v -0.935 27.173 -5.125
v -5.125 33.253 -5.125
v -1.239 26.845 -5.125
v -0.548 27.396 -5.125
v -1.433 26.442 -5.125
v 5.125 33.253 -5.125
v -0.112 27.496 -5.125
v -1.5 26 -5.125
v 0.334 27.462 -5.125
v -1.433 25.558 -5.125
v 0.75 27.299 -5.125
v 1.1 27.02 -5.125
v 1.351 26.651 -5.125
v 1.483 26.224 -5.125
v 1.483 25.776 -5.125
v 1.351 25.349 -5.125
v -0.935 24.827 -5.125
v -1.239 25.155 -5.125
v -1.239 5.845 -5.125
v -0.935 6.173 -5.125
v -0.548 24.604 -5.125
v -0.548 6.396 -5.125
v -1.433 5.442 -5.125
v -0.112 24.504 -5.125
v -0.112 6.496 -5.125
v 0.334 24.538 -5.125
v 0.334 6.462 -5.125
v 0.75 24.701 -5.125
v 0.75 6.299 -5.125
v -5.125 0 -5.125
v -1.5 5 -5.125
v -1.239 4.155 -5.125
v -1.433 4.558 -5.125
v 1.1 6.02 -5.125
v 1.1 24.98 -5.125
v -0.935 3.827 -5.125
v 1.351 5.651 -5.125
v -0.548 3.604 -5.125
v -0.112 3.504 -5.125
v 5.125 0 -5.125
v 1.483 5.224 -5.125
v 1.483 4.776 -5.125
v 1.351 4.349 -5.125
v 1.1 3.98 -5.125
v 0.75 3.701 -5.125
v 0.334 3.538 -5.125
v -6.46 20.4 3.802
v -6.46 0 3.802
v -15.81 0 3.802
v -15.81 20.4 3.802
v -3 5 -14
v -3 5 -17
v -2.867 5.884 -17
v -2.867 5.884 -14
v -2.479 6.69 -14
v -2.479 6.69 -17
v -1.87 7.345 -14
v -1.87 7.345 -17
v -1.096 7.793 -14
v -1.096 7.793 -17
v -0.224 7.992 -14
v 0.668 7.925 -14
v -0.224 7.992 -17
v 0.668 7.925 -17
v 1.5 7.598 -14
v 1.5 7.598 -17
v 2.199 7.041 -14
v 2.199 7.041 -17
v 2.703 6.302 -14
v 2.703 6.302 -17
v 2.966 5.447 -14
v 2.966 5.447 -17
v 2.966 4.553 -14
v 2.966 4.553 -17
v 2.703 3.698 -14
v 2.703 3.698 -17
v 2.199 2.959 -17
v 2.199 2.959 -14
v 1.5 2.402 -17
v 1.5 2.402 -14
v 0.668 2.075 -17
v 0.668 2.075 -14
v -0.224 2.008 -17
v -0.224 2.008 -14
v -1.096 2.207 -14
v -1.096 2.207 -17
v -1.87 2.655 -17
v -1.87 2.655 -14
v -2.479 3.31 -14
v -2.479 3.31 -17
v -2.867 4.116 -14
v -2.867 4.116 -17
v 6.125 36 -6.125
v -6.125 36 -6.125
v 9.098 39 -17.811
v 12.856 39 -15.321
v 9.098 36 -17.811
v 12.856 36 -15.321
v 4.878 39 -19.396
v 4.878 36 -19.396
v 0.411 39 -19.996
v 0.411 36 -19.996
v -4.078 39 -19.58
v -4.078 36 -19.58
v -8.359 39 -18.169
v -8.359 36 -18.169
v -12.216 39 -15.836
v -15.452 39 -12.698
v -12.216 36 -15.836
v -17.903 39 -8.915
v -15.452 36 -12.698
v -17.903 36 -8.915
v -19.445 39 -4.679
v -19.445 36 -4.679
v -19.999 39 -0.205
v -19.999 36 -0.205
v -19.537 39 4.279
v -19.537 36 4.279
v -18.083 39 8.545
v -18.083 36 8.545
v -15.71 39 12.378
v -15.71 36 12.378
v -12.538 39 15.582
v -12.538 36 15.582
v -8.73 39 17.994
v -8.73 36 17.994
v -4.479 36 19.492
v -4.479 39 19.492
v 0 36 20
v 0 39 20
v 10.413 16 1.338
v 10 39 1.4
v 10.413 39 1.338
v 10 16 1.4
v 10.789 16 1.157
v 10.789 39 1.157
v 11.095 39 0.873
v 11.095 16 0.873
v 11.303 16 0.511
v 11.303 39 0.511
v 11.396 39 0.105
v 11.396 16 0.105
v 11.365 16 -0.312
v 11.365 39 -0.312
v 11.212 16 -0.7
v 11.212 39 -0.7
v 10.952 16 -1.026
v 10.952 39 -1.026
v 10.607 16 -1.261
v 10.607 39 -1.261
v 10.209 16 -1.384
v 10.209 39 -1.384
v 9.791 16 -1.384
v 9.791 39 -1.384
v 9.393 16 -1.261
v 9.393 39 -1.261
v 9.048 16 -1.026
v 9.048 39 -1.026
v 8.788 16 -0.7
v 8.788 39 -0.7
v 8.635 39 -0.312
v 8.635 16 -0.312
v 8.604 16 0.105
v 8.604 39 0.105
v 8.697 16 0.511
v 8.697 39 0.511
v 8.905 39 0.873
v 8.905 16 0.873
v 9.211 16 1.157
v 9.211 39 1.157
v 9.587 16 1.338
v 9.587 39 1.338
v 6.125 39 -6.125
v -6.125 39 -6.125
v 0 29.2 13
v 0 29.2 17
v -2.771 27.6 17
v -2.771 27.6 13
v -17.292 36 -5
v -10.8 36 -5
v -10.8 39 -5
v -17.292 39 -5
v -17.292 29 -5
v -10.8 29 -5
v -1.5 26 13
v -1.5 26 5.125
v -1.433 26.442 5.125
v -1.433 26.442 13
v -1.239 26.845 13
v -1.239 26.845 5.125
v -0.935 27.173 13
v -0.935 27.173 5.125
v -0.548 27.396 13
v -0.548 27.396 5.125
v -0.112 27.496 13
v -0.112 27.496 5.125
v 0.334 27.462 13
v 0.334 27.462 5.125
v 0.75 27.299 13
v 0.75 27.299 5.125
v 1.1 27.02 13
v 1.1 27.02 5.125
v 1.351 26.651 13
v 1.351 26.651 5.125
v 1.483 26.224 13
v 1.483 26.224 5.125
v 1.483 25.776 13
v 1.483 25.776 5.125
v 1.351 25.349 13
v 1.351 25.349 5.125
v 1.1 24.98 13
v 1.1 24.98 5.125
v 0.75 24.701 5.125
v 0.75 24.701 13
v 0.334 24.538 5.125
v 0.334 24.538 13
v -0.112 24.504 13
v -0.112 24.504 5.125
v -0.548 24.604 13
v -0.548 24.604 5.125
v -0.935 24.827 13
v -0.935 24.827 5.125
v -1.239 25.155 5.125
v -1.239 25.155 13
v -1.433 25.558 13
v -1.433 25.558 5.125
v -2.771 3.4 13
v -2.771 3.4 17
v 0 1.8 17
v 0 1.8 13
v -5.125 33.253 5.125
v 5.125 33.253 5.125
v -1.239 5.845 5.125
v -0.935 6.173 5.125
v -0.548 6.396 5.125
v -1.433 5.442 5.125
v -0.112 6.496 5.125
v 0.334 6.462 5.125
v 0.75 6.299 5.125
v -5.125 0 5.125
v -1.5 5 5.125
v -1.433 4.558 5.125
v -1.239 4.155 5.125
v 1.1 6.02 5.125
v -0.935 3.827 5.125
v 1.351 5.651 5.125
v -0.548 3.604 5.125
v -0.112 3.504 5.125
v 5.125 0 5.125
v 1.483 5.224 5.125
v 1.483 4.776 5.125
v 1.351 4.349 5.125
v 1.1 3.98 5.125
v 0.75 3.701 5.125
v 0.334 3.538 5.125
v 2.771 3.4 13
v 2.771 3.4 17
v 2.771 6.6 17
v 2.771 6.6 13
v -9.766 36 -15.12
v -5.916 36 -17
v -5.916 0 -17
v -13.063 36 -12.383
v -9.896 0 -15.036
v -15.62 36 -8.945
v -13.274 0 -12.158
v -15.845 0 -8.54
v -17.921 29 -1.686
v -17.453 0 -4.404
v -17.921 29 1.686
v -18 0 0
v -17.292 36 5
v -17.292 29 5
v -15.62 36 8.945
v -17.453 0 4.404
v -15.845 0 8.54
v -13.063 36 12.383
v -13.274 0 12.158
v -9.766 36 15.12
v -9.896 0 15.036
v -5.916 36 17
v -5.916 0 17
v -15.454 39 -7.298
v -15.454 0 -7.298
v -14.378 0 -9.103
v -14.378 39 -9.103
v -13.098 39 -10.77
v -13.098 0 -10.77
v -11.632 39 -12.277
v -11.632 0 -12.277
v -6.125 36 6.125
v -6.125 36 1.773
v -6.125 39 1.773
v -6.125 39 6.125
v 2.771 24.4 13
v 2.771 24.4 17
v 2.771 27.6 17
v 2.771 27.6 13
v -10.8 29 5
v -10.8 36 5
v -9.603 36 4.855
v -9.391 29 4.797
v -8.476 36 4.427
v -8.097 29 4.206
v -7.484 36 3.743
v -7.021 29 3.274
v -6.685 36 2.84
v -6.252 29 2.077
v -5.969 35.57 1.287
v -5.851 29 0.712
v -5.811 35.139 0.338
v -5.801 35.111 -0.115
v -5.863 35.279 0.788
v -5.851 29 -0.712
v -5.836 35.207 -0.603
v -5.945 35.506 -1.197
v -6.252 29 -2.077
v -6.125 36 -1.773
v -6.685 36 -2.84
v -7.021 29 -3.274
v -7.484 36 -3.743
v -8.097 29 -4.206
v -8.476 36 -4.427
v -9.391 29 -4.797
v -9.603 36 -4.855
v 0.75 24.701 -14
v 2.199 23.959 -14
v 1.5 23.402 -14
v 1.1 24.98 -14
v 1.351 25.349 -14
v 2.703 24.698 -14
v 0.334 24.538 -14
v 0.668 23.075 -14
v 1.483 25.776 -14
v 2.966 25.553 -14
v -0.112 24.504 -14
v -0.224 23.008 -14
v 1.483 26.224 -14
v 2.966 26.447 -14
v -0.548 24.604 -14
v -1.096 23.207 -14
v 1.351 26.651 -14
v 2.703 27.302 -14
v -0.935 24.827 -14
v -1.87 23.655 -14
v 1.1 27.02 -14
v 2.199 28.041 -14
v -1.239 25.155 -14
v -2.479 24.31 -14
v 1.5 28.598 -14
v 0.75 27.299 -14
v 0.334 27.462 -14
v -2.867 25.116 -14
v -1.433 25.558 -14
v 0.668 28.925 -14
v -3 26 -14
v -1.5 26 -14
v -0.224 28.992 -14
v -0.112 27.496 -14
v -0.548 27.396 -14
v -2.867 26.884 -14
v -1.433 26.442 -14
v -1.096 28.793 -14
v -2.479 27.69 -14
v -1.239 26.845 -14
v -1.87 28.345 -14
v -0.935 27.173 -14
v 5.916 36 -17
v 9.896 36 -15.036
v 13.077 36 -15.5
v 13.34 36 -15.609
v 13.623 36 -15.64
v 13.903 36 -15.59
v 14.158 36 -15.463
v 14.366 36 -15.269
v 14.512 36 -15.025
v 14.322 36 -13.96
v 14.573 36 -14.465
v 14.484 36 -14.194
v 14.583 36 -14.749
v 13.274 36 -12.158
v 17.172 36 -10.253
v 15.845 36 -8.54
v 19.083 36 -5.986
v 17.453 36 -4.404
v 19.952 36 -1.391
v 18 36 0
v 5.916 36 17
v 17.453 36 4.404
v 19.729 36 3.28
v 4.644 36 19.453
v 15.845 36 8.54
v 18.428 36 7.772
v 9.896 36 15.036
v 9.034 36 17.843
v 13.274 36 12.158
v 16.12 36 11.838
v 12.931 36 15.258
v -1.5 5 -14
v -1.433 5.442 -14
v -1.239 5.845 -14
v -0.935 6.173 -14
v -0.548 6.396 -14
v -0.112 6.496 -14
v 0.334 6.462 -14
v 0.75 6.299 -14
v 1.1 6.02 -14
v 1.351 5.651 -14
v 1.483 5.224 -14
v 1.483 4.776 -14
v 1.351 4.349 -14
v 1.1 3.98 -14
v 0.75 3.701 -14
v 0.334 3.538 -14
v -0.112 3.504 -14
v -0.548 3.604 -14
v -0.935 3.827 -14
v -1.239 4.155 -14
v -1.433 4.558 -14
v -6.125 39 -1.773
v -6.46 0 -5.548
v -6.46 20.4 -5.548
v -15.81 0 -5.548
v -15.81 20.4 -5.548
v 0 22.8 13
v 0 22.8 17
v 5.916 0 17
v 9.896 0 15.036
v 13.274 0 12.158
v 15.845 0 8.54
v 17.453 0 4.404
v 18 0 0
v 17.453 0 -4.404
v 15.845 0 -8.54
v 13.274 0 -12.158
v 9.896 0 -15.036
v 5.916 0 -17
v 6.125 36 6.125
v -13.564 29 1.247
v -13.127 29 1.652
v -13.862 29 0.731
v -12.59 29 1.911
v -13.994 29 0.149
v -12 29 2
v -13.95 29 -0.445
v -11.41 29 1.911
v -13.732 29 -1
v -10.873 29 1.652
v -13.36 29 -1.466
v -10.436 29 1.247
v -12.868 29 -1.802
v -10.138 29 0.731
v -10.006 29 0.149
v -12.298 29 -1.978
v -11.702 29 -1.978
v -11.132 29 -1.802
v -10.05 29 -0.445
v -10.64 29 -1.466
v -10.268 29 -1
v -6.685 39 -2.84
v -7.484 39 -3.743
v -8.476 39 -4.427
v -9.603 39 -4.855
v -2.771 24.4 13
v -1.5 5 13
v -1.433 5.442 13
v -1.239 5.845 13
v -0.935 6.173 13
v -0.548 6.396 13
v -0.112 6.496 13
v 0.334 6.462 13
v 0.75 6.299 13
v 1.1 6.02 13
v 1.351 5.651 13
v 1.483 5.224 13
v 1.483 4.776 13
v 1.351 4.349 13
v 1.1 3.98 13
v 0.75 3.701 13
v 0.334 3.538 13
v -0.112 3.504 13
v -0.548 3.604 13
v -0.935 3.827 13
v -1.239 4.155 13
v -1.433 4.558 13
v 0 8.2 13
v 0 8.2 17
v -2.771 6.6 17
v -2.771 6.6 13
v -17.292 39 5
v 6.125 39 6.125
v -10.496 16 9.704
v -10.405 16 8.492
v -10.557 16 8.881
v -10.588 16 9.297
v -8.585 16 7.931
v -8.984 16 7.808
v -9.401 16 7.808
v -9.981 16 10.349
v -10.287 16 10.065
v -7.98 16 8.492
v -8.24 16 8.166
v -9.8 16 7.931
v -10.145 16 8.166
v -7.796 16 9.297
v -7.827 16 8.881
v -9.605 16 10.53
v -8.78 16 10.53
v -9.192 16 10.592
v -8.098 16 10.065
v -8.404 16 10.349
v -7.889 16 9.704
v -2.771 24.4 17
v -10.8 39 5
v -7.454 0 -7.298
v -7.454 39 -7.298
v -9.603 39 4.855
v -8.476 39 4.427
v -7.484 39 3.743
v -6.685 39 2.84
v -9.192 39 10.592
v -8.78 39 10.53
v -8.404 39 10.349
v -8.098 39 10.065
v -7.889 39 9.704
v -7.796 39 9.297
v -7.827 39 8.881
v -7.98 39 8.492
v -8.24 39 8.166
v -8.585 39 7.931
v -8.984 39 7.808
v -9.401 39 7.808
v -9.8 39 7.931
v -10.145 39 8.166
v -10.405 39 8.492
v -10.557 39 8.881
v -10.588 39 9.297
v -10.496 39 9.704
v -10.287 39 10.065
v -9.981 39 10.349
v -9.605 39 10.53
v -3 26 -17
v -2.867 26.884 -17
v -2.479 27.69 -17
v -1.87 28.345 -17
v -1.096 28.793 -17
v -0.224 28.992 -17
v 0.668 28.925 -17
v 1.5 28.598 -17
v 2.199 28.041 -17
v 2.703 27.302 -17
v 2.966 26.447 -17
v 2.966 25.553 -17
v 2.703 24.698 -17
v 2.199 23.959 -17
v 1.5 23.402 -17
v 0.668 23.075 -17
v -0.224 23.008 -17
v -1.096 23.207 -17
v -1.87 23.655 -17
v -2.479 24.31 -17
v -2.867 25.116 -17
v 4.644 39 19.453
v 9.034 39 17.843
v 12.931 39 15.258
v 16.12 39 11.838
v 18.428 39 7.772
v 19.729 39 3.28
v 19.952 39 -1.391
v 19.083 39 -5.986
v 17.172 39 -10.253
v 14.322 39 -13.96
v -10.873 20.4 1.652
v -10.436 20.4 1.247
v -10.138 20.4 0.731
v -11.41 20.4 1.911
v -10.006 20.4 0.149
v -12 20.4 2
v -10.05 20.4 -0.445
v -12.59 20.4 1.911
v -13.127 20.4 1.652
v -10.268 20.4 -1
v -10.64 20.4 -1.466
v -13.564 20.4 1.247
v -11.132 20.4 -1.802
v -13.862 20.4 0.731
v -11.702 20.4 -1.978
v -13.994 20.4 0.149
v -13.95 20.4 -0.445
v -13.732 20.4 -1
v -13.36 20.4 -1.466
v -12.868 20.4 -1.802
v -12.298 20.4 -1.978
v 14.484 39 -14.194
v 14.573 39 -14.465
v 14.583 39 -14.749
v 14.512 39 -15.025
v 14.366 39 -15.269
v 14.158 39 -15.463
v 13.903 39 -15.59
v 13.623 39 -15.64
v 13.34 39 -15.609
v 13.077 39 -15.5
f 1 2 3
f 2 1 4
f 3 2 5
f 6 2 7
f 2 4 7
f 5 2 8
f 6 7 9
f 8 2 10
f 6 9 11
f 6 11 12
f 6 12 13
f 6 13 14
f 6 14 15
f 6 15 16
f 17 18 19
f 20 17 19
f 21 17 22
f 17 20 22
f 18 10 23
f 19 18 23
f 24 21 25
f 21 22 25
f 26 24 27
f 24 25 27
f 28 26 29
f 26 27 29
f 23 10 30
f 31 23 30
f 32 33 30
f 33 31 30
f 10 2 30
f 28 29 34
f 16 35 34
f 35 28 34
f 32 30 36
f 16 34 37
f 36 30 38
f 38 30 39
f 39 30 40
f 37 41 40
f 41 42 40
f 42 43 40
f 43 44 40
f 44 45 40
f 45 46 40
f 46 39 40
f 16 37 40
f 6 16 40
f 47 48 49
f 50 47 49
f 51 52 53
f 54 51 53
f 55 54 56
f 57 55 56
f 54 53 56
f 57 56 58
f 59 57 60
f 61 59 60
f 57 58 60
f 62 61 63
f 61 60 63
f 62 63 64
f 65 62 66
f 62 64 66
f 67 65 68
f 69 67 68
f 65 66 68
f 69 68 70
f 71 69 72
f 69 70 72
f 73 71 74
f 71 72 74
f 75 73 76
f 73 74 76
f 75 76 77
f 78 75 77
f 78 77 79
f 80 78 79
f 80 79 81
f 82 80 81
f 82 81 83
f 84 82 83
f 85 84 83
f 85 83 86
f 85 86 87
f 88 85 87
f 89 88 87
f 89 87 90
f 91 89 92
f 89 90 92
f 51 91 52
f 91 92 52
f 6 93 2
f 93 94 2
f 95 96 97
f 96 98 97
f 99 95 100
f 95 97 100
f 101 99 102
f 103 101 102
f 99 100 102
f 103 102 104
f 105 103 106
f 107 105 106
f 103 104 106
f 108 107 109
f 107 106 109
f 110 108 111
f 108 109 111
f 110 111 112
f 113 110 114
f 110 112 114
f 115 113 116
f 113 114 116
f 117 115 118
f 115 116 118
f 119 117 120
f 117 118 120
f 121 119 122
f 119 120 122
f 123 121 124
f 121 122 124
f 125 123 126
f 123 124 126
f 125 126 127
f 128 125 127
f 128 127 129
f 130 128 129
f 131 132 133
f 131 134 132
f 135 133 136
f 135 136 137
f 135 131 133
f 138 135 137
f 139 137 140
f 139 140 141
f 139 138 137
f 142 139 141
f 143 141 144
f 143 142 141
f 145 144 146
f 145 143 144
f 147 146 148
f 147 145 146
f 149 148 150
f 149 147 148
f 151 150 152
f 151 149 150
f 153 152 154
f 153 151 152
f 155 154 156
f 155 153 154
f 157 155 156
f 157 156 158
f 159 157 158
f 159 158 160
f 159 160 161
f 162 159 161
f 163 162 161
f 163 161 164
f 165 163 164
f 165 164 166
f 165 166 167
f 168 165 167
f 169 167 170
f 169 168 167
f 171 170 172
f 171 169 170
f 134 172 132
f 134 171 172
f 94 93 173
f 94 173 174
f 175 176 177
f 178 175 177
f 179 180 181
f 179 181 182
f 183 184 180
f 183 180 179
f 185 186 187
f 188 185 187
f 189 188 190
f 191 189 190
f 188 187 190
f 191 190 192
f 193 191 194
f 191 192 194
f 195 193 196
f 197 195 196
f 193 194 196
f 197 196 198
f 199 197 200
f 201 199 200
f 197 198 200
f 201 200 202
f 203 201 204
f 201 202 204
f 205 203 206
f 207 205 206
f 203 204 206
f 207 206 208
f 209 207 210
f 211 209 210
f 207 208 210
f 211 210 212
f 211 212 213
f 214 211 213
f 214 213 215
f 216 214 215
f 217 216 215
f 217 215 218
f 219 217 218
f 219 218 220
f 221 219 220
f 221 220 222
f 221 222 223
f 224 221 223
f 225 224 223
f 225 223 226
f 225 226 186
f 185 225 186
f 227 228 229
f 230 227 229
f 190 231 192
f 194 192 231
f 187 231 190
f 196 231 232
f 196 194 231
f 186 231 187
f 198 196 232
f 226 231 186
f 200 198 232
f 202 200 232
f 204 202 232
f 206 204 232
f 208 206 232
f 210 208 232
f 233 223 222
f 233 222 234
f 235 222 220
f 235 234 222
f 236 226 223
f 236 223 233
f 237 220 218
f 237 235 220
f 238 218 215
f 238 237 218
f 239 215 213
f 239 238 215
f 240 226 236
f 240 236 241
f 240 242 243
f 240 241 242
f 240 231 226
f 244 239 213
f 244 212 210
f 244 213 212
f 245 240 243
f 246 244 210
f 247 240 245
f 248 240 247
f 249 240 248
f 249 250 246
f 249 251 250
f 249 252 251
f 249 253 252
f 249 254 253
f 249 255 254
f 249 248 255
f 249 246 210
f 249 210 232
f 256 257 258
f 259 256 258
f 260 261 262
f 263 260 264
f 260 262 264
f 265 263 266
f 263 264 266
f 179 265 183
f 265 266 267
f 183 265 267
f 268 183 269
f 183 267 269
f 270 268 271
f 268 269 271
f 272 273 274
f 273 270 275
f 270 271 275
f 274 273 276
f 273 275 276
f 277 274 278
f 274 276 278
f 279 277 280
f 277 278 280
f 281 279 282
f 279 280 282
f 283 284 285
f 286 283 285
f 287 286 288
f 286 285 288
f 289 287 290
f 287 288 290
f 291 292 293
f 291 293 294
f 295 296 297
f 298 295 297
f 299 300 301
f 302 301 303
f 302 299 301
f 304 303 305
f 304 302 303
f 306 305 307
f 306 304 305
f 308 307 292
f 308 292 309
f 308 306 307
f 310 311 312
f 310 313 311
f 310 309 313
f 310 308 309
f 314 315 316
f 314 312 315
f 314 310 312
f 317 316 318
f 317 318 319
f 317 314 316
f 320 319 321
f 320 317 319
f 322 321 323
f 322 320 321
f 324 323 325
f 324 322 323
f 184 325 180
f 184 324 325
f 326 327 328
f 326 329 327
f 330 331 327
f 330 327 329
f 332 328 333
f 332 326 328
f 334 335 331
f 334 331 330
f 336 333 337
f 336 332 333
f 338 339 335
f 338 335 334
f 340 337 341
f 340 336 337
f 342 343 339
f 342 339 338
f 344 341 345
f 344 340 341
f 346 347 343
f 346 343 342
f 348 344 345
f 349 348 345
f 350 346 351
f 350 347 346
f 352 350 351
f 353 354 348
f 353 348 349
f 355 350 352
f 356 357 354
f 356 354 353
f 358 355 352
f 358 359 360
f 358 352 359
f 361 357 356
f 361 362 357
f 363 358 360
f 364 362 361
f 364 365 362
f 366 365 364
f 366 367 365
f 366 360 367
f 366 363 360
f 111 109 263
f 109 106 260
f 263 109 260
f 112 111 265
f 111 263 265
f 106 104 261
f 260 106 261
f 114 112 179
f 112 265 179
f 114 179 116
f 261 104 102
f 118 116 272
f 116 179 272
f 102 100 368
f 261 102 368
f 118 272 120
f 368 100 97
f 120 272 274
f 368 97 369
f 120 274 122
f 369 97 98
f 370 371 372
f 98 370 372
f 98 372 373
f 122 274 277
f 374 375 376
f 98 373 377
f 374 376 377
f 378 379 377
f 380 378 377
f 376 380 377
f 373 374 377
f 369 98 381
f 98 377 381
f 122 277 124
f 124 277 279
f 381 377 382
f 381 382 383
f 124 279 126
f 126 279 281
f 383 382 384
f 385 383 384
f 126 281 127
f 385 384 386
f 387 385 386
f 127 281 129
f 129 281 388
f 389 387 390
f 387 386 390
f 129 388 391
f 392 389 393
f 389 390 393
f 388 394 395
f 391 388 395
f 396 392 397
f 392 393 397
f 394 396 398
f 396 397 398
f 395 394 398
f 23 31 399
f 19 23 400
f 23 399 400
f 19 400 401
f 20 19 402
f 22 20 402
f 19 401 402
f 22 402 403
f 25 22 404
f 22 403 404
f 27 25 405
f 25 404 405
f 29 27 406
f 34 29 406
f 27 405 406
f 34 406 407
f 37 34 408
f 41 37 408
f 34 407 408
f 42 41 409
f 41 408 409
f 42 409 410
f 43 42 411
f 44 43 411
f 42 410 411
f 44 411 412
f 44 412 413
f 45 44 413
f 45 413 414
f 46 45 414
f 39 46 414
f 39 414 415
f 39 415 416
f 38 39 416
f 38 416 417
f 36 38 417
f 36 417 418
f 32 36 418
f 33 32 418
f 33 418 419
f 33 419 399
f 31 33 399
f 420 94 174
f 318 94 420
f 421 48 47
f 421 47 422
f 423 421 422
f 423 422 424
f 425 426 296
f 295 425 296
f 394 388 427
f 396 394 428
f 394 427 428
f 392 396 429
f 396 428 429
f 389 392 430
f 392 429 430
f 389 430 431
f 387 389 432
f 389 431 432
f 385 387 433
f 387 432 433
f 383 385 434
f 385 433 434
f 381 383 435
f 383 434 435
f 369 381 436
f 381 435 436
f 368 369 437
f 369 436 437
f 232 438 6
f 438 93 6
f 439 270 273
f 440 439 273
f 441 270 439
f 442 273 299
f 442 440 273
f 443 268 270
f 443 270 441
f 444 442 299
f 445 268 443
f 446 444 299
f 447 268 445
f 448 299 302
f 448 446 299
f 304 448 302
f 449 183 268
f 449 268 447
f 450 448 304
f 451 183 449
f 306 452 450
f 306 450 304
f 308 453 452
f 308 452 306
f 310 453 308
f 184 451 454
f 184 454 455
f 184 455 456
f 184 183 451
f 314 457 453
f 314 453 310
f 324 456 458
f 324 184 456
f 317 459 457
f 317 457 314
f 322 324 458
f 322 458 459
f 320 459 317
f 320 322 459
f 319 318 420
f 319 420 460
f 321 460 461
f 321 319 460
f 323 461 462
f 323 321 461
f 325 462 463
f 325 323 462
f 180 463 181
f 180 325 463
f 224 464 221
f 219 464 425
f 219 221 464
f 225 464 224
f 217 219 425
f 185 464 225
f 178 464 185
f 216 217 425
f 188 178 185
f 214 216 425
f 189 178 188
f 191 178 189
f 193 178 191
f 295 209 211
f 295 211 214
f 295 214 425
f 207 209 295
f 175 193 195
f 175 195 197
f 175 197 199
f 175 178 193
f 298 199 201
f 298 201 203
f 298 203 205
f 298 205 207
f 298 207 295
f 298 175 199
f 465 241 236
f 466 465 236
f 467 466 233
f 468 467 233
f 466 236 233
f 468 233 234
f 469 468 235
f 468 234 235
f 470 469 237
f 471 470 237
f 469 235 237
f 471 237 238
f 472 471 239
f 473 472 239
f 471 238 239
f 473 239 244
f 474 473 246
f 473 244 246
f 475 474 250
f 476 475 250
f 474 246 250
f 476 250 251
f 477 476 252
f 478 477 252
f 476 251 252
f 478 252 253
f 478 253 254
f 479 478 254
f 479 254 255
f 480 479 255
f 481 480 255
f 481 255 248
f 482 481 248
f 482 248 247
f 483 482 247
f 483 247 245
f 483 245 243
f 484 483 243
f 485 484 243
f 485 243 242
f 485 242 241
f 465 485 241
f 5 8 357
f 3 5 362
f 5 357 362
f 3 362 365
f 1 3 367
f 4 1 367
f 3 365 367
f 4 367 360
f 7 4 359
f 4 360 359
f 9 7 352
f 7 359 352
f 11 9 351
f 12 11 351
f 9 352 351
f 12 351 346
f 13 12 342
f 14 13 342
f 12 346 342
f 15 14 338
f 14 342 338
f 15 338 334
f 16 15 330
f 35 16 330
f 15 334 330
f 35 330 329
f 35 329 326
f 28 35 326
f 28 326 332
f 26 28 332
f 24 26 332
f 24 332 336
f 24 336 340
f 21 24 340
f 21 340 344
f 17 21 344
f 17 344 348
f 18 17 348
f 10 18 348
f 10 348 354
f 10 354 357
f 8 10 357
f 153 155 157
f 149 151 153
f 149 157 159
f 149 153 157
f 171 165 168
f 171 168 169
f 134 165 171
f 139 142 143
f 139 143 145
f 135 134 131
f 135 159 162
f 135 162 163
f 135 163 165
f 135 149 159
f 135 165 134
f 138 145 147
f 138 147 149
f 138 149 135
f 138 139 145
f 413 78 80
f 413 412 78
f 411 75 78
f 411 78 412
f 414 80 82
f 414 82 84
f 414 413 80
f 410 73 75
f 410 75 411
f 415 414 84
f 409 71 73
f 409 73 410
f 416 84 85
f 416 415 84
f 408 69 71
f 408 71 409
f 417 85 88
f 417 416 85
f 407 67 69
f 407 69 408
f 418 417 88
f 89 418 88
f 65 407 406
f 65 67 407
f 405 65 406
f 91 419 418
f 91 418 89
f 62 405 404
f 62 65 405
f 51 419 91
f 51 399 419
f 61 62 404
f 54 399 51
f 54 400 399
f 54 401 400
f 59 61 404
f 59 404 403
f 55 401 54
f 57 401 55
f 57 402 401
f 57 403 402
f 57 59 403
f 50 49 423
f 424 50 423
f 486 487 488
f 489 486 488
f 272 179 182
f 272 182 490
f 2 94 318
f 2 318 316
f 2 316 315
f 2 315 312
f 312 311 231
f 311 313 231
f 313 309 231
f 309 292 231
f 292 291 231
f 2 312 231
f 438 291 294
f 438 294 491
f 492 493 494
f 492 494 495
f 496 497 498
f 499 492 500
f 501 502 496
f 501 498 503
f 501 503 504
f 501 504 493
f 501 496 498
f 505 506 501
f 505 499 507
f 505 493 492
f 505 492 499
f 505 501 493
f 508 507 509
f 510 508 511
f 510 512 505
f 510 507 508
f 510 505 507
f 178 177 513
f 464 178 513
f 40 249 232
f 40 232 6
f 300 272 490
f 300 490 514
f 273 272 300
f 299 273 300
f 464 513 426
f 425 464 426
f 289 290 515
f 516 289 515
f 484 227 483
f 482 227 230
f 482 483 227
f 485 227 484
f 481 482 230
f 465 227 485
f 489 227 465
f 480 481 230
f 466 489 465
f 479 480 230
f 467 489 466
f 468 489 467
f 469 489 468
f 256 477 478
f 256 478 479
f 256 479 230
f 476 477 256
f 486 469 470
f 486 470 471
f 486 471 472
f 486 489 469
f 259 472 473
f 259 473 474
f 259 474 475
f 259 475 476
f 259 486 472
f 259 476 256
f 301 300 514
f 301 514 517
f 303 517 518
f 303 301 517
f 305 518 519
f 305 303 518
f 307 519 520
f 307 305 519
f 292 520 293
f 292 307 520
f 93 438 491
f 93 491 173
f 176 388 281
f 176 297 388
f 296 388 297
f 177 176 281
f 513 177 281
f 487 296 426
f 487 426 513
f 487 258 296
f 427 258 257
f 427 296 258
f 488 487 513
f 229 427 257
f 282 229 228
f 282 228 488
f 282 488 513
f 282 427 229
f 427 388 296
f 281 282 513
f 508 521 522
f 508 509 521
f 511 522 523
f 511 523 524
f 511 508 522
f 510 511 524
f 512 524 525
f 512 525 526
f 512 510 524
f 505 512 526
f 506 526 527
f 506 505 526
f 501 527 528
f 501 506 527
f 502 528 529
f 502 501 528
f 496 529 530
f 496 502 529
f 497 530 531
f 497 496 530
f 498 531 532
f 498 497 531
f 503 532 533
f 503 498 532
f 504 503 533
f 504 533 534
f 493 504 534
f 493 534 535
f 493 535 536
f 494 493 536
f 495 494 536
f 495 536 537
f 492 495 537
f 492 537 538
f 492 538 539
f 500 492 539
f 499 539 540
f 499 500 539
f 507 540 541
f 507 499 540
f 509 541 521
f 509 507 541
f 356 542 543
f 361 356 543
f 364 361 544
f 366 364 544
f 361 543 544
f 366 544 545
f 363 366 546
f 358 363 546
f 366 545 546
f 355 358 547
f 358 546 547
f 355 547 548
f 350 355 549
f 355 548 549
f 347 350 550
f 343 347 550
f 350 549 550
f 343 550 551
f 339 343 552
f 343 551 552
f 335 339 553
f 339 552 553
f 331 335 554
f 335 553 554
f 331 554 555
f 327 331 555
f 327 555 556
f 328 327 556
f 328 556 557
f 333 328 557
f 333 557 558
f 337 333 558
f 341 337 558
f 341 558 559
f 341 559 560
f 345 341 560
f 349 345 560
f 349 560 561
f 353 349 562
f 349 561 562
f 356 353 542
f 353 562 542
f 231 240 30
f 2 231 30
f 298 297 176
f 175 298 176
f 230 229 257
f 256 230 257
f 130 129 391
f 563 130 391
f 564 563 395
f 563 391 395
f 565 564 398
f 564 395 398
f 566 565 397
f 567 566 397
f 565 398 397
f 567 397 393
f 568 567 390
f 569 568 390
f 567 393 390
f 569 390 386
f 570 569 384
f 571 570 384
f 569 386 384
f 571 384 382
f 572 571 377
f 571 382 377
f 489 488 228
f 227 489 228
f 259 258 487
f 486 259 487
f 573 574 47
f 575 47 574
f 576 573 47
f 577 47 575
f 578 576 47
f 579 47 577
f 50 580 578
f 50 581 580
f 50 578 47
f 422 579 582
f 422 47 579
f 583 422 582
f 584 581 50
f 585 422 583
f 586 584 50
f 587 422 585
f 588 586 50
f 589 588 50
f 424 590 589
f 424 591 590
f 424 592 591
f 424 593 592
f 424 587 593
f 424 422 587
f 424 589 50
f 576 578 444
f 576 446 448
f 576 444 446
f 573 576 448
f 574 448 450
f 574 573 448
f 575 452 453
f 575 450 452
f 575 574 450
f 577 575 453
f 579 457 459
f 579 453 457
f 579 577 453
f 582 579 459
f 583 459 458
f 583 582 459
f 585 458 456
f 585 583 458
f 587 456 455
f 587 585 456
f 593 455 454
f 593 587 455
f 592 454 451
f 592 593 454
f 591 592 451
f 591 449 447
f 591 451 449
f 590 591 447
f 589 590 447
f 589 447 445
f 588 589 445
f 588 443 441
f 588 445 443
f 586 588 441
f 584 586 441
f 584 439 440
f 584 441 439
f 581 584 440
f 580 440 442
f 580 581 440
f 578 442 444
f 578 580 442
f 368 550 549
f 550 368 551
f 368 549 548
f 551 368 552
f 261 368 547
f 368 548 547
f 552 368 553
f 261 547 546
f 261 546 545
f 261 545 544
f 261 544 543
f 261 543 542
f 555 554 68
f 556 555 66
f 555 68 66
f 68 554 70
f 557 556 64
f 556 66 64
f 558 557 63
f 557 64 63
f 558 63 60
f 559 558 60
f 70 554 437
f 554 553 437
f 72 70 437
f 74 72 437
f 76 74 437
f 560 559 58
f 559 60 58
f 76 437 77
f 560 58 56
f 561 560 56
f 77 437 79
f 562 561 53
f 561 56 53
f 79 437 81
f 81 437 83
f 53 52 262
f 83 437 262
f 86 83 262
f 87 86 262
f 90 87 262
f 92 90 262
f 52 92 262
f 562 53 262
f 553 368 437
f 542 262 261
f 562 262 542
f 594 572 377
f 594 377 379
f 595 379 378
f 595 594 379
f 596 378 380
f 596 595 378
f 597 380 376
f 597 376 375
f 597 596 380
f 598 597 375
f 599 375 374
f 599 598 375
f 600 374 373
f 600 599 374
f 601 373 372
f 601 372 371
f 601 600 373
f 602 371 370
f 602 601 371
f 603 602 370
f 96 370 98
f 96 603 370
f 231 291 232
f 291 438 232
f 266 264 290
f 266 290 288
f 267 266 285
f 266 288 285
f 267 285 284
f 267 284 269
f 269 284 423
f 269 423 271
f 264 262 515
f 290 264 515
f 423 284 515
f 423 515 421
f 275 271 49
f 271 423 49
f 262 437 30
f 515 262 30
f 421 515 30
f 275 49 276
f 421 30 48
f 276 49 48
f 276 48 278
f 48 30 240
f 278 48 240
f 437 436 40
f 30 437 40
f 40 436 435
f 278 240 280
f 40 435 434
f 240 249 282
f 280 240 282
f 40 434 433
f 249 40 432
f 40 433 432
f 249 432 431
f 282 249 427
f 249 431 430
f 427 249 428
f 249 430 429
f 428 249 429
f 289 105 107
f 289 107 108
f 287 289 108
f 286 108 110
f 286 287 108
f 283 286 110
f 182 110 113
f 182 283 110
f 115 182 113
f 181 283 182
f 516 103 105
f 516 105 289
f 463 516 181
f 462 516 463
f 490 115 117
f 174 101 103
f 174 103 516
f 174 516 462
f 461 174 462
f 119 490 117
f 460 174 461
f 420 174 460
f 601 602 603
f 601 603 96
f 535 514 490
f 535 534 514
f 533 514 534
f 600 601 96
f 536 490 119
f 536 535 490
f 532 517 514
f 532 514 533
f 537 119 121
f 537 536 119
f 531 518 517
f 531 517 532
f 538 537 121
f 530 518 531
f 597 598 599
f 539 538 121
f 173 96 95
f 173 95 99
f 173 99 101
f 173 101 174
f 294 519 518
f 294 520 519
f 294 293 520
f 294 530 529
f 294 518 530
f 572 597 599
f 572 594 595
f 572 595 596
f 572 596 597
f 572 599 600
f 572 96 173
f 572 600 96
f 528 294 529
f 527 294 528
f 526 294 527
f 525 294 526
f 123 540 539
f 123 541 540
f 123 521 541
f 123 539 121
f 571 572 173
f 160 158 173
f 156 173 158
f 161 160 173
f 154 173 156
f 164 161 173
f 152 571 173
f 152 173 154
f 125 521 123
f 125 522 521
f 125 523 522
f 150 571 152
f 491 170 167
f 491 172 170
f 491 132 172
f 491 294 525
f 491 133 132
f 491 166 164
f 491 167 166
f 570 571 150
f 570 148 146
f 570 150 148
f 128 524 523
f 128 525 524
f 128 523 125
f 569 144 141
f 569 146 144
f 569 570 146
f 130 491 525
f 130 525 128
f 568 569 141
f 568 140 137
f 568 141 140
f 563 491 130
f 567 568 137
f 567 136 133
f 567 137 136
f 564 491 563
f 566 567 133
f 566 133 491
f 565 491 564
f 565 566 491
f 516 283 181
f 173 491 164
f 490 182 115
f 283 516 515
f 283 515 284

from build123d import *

# Parameters (mm, degrees)
SKETCH1_R           = 18
SKETCH1_R_2         = 2
SKETCH1_W           = 10.25
SKETCH1_H           = 10.25
BOSS_EXTRUDE1_DEPTH = 36
CUT_EXTRUDE1_START  = -7
CUT_EXTRUDE1_DEPTH  = 7
SKETCH4_W           = 9.35
SKETCH4_H           = 9.35
CUT_EXTRUDE3_DEPTH  = 20.4
CUT_EXTRUDE4_START  = -40
CUT_EXTRUDE4_DEPTH  = 40
SKETCH6_R           = 1.5
CUT_EXTRUDE5_DEPTH  = 53.687759489
SKETCH7_R           = 3
CUT_EXTRUDE6_DEPTH  = 3
CUT_EXTRUDE7_DEPTH  = 4
CHAMFER1_SIZE       = 1
CHAMFER1_SIZE_2     = 2.747477419
CUT_EXTRUDE8_DEPTH  = 44.69210455
SKETCH12_R          = 1.4
CUT_EXTRUDE10_DEPTH = 20
SKETCH13_R          = 20
SKETCH13_R_2        = 1.4
BOSS_EXTRUDE2_DEPTH = 3
BOSS_EXTRUDE3_DEPTH = 3


with BuildPart() as part:
    # Sketch1 → Boss-Extrude1 (new body)
    with BuildSketch(Plane(origin=(0, 0, 0), x_dir=(1, 0, 0), z_dir=(0, 1, 0))):
        with Locations(Location((0, 0, 0), (0, 0, 270))):
            Circle(SKETCH1_R)
        with Locations(Location((-12, 0, 0), (0, 0, 270))):
            Circle(SKETCH1_R_2, mode=Mode.SUBTRACT)
        Rectangle(SKETCH1_W, SKETCH1_H, mode=Mode.SUBTRACT)
    extrude(amount=BOSS_EXTRUDE1_DEPTH)

    # Sketch2 → Cut-Extrude1 (cut)
    with BuildSketch(Plane(origin=(0, 36, 0), x_dir=(1, 0, 0), z_dir=(0, 1, 0)).offset(CUT_EXTRUDE1_START)):
        with BuildLine():
            Line((-10.8, 5), (-17.291616466, 5))
            ThreePointArc((-17.291616466, 5), (-18, 0), (-17.291616466, -5))
            Line((-17.291616466, -5), (-10.8, -5))
            ThreePointArc((-10.8, -5), (-5.8, 0), (-10.8, 5))
        make_face()
    extrude(amount=CUT_EXTRUDE1_DEPTH, mode=Mode.SUBTRACT)

    # Sketch4 → Cut-Extrude3 (cut)
    with BuildSketch(Plane(origin=(0, 0, 0), x_dir=(-1, 0, 0), z_dir=(0, -1, 0))):
        with Locations((11.135393506, 0.872889968)):
            Rectangle(SKETCH4_W, SKETCH4_H)
    extrude(amount=-CUT_EXTRUDE3_DEPTH, mode=Mode.SUBTRACT)

    # Sketch5 → Cut-Extrude4 (cut)
    with BuildSketch(Plane(origin=(0, 36, 0), x_dir=(1, 0, 0), z_dir=(0, 1, 0)).offset(CUT_EXTRUDE4_START)):
        with BuildLine():
            Line((5.916079783, 17), (-5.916079783, 17))
            ThreePointArc((-5.916079783, 17), (0, 18), (5.916079783, 17))
        make_face()
        with BuildLine():
            Line((5.916079783, -17), (-5.916079783, -17))
            ThreePointArc((-5.916079783, -17), (0, -18), (5.916079783, -17))
        make_face()
    extrude(amount=CUT_EXTRUDE4_DEPTH, mode=Mode.SUBTRACT)

    # Sketch6 → Cut-Extrude5 (cut, through all)
    with BuildSketch(Plane(origin=(0, 0, -17), x_dir=(-1, 0, 0), z_dir=(0, 0, -1))):
        with Locations((0, 26)):
            Circle(SKETCH6_R)
        with Locations((0, 5)):
            Circle(SKETCH6_R)
    extrude(amount=-CUT_EXTRUDE5_DEPTH, mode=Mode.SUBTRACT)

    # Sketch7 → Cut-Extrude6 (cut)
    with BuildSketch(Plane(origin=(0, 0, -17), x_dir=(-1, 0, 0), z_dir=(0, 0, -1))):
        with Locations((0, 26)):
            Circle(SKETCH7_R)
        with Locations((0, 5)):
            Circle(SKETCH7_R)
    extrude(amount=-CUT_EXTRUDE6_DEPTH, mode=Mode.SUBTRACT)

    # Sketch8 → Cut-Extrude7 (cut)
    with BuildSketch(Plane.XY.offset(17)):
        Polygon((0, 22.8), (2.771281292, 24.4), (2.771281292, 27.6), (0, 29.2), (-2.771281292, 27.6), (-2.771281292, 24.4), align=None)
        Polygon((0, 1.8), (2.771281292, 3.4), (2.771281292, 6.6), (0, 8.2), (-2.771281292, 6.6), (-2.771281292, 3.4), align=None)
    extrude(amount=-CUT_EXTRUDE7_DEPTH, mode=Mode.SUBTRACT)

    # Chamfer1
    # the kernel refuses this chamfer: 2.747477419, 1 mm, written as the material it takes off along each edge
    with BuildSketch(Plane(origin=(-5.125, 36, -5.125), x_dir=(0, 0.09904090225204956, -0.9950833631817488), z_dir=(1, 0, 0)), Plane(origin=(-5.125, 36, 5.125), x_dir=(-0.9950833631817488, 0.09904090225204956, 0), z_dir=(0, 0, -1)), Plane(origin=(5.125, 36, 5.125), x_dir=(0, 0.09904090225204956, 0.9950833631817488), z_dir=(-1, 0, 0)), Plane(origin=(5.125, 36, -5.125), x_dir=(0.9950833631817488, 0.09904090225204956, 0), z_dir=(0, 0, 1))) as chamfer1_piece_1:
        Polygon((CHAMFER1_SIZE * 0.995083363182, -CHAMFER1_SIZE * 0.099040902252), (-CHAMFER1_SIZE_2 * 0.0990409022684, -CHAMFER1_SIZE_2 * 0.995083363346), (0, 0), align=None)
    extrude(amount=10.25, mode=Mode.SUBTRACT)
    with BuildSketch(Plane(origin=(-5.125, 36, 5.125), x_dir=(-0.9950833631817488, 0.09904090225204956, 0), z_dir=(0, 0, -1))) as chamfer1_piece_2a_section:
        Polygon((CHAMFER1_SIZE * 0.995083363182, -CHAMFER1_SIZE * 0.099040902252), (-CHAMFER1_SIZE_2 * 0.0990409022684, -CHAMFER1_SIZE_2 * 0.995083363346), (0, 0), align=None)
    chamfer1_piece_2a = extrude(amount=17.377491449, mode=Mode.PRIVATE)
    chamfer1_piece_2a = split(chamfer1_piece_2a, bisect_by=Plane(origin=(-5.432505006, 35.059901151, -5.125), z_dir=(0, 0, -1)), keep=Keep.TOP, mode=Mode.PRIVATE)
    with BuildSketch(Plane(origin=(-12.252491449, 36, -5.125), x_dir=(0, 0.09904090225204956, -0.9950833631817488), z_dir=(1, 0, 0))) as chamfer1_piece_2b_section:
        Polygon((CHAMFER1_SIZE * 0.995083363182, -CHAMFER1_SIZE * 0.099040902252), (-CHAMFER1_SIZE_2 * 0.0990409022684, -CHAMFER1_SIZE_2 * 0.995083363346), (0, 0), align=None)
    chamfer1_piece_2b = extrude(amount=17.377491449, mode=Mode.PRIVATE)
    chamfer1_piece_2b = split(chamfer1_piece_2b, bisect_by=Plane(origin=(-5.125, 35.059901151, -5.432505006), z_dir=(-1, 0, 0)), keep=Keep.TOP, mode=Mode.PRIVATE)
    chamfer1_piece_2 = chamfer1_piece_2a & chamfer1_piece_2b
    add(chamfer1_piece_2, mode=Mode.SUBTRACT)
    with BuildSketch(Plane(origin=(5.125, 36, -12.252491449), x_dir=(0.9950833631817488, 0.09904090225204956, 0), z_dir=(0, 0, 1))) as chamfer1_piece_3a_section:
        Polygon((CHAMFER1_SIZE * 0.995083363182, -CHAMFER1_SIZE * 0.099040902252), (-CHAMFER1_SIZE_2 * 0.0990409022684, -CHAMFER1_SIZE_2 * 0.995083363346), (0, 0), align=None)
    chamfer1_piece_3a = extrude(amount=17.377491449, mode=Mode.PRIVATE)
    chamfer1_piece_3a = split(chamfer1_piece_3a, bisect_by=Plane(origin=(5.432505006, 35.059901151, -5.125), z_dir=(0, 0, -1)), keep=Keep.TOP, mode=Mode.PRIVATE)
    with BuildSketch(Plane(origin=(-5.125, 36, -5.125), x_dir=(0, 0.09904090225204956, -0.9950833631817488), z_dir=(1, 0, 0))) as chamfer1_piece_3b_section:
        Polygon((CHAMFER1_SIZE * 0.995083363182, -CHAMFER1_SIZE * 0.099040902252), (-CHAMFER1_SIZE_2 * 0.0990409022684, -CHAMFER1_SIZE_2 * 0.995083363346), (0, 0), align=None)
    chamfer1_piece_3b = extrude(amount=17.377491449, mode=Mode.PRIVATE)
    chamfer1_piece_3b = split(chamfer1_piece_3b, bisect_by=Plane(origin=(5.125, 35.059901151, -5.432505006), z_dir=(1, 0, 0)), keep=Keep.TOP, mode=Mode.PRIVATE)
    chamfer1_piece_3 = chamfer1_piece_3a & chamfer1_piece_3b
    add(chamfer1_piece_3, mode=Mode.SUBTRACT)
    with BuildSketch(Plane(origin=(5.125, 36, 5.125), x_dir=(0, 0.09904090225204956, 0.9950833631817488), z_dir=(-1, 0, 0))) as chamfer1_piece_4a_section:
        Polygon((CHAMFER1_SIZE * 0.995083363182, -CHAMFER1_SIZE * 0.099040902252), (-CHAMFER1_SIZE_2 * 0.0990409022684, -CHAMFER1_SIZE_2 * 0.995083363346), (0, 0), align=None)
    chamfer1_piece_4a = extrude(amount=17.377491449, mode=Mode.PRIVATE)
    chamfer1_piece_4a = split(chamfer1_piece_4a, bisect_by=Plane(origin=(-5.125, 35.059901151, 5.432505006), z_dir=(-1, 0, 0)), keep=Keep.TOP, mode=Mode.PRIVATE)
    with BuildSketch(Plane(origin=(-5.125, 36, 12.252491449), x_dir=(-0.9950833631817488, 0.09904090225204956, 0), z_dir=(0, 0, -1))) as chamfer1_piece_4b_section:
        Polygon((CHAMFER1_SIZE * 0.995083363182, -CHAMFER1_SIZE * 0.099040902252), (-CHAMFER1_SIZE_2 * 0.0990409022684, -CHAMFER1_SIZE_2 * 0.995083363346), (0, 0), align=None)
    chamfer1_piece_4b = extrude(amount=17.377491449, mode=Mode.PRIVATE)
    chamfer1_piece_4b = split(chamfer1_piece_4b, bisect_by=Plane(origin=(-5.432505006, 35.059901151, 5.125), z_dir=(0, 0, 1)), keep=Keep.TOP, mode=Mode.PRIVATE)
    chamfer1_piece_4 = chamfer1_piece_4a & chamfer1_piece_4b
    add(chamfer1_piece_4, mode=Mode.SUBTRACT)
    with BuildSketch(Plane(origin=(12.252491449, 36, 5.125), x_dir=(0, 0.09904090225204956, 0.9950833631817488), z_dir=(-1, 0, 0))) as chamfer1_piece_5a_section:
        Polygon((CHAMFER1_SIZE * 0.995083363182, -CHAMFER1_SIZE * 0.099040902252), (-CHAMFER1_SIZE_2 * 0.0990409022684, -CHAMFER1_SIZE_2 * 0.995083363346), (0, 0), align=None)
    chamfer1_piece_5a = extrude(amount=17.377491449, mode=Mode.PRIVATE)
    chamfer1_piece_5a = split(chamfer1_piece_5a, bisect_by=Plane(origin=(5.125, 35.059901151, 5.432505006), z_dir=(1, 0, 0)), keep=Keep.TOP, mode=Mode.PRIVATE)
    with BuildSketch(Plane(origin=(5.125, 36, -5.125), x_dir=(0.9950833631817488, 0.09904090225204956, 0), z_dir=(0, 0, 1))) as chamfer1_piece_5b_section:
        Polygon((CHAMFER1_SIZE * 0.995083363182, -CHAMFER1_SIZE * 0.099040902252), (-CHAMFER1_SIZE_2 * 0.0990409022684, -CHAMFER1_SIZE_2 * 0.995083363346), (0, 0), align=None)
    chamfer1_piece_5b = extrude(amount=17.377491449, mode=Mode.PRIVATE)
    chamfer1_piece_5b = split(chamfer1_piece_5b, bisect_by=Plane(origin=(5.432505006, 35.059901151, 5.125), z_dir=(0, 0, 1)), keep=Keep.TOP, mode=Mode.PRIVATE)
    chamfer1_piece_5 = chamfer1_piece_5a & chamfer1_piece_5b
    add(chamfer1_piece_5, mode=Mode.SUBTRACT)

    # Sketch9 → Cut-Extrude8 (cut, through all)
    with BuildSketch(Plane.XZ):
        with BuildLine():
            Line((-7.454203172, -7.297889968), (-15.454203172, -7.297889968))
            ThreePointArc((-15.454203172, -7.297889968), (-13.761984914, -9.955415688), (-11.632322635, -12.277178848))
            Line((-11.632322635, -12.277178848), (-7.454203172, -7.297889968))
        make_face()
    extrude(amount=-CUT_EXTRUDE8_DEPTH, mode=Mode.SUBTRACT)

    # Sketch12 → Cut-Extrude10 (cut)
    with BuildSketch(Plane(origin=(0, 36, 0), x_dir=(1, 0, 0), z_dir=(0, 1, 0))):
        with Locations(Location((10, 0, 0), (0, 0, 270))):
            Circle(SKETCH12_R)
        with Locations(Location((-9.192388155, -9.192388155, 0), (0, 0, 270))):
            Circle(SKETCH12_R)
    extrude(amount=-CUT_EXTRUDE10_DEPTH, mode=Mode.SUBTRACT)

    # Sketch13 → Boss-Extrude2 (add)
    with BuildSketch(Plane(origin=(0, 36, 0), x_dir=(1, 0, 0), z_dir=(0, 1, 0))):
        with Locations(Location((0, 0, 0), (0, 0, 270))):
            Circle(SKETCH13_R)
        with Locations(Location((10, 0, 0), (0, 0, 270))):
            Circle(SKETCH13_R_2, mode=Mode.SUBTRACT)
        with Locations(Location((-9.192388155, -9.192388155, 0), (0, 0, 270))):
            Circle(SKETCH13_R_2, mode=Mode.SUBTRACT)
        with BuildLine():
            Line((-10.8, 5), (-17.291616466, 5))
            Line((-17.291616466, 5), (-17.291616466, -5))
            Line((-17.291616466, -5), (-10.8, -5))
            ThreePointArc((-10.8, -5), (-7.959770503, -4.114984375), (-6.125, -1.773238563))
            Line((-6.125, -1.773238563), (-6.125, -6.125))
            Line((-6.125, -6.125), (6.125, -6.125))
            Line((6.125, -6.125), (6.125, 6.125))
            Line((6.125, 6.125), (-6.125, 6.125))
            Line((-6.125, 6.125), (-6.125, 1.773238563))
            ThreePointArc((-6.125, 1.773238563), (-7.959770503, 4.114984375), (-10.8, 5))
        make_face(mode=Mode.SUBTRACT)
        with BuildLine():
            Line((-7.454203172, 7.297889968), (-15.454203172, 7.297889968))
            ThreePointArc((-15.454203172, 7.297889968), (-13.761984914, 9.955415688), (-11.632322635, 12.277178848))
            Line((-11.632322635, 12.277178848), (-7.454203172, 7.297889968))
        make_face(mode=Mode.SUBTRACT)
    extrude(amount=BOSS_EXTRUDE2_DEPTH)

    # Sketch14 → Boss-Extrude3 (add)
    with BuildSketch(Plane(origin=(0, 39, 0), x_dir=(1, 0, 0), z_dir=(0, 1, 0))):
        with BuildLine():
            Line((12.855752194, 15.320888862), (14.321646009, 13.960317173))
            ThreePointArc((14.321646009, 13.960317173), (14.268984946, 15.373549926), (12.855752194, 15.320888862))
        make_face()
    extrude(amount=-BOSS_EXTRUDE3_DEPTH)


solid = part.part
